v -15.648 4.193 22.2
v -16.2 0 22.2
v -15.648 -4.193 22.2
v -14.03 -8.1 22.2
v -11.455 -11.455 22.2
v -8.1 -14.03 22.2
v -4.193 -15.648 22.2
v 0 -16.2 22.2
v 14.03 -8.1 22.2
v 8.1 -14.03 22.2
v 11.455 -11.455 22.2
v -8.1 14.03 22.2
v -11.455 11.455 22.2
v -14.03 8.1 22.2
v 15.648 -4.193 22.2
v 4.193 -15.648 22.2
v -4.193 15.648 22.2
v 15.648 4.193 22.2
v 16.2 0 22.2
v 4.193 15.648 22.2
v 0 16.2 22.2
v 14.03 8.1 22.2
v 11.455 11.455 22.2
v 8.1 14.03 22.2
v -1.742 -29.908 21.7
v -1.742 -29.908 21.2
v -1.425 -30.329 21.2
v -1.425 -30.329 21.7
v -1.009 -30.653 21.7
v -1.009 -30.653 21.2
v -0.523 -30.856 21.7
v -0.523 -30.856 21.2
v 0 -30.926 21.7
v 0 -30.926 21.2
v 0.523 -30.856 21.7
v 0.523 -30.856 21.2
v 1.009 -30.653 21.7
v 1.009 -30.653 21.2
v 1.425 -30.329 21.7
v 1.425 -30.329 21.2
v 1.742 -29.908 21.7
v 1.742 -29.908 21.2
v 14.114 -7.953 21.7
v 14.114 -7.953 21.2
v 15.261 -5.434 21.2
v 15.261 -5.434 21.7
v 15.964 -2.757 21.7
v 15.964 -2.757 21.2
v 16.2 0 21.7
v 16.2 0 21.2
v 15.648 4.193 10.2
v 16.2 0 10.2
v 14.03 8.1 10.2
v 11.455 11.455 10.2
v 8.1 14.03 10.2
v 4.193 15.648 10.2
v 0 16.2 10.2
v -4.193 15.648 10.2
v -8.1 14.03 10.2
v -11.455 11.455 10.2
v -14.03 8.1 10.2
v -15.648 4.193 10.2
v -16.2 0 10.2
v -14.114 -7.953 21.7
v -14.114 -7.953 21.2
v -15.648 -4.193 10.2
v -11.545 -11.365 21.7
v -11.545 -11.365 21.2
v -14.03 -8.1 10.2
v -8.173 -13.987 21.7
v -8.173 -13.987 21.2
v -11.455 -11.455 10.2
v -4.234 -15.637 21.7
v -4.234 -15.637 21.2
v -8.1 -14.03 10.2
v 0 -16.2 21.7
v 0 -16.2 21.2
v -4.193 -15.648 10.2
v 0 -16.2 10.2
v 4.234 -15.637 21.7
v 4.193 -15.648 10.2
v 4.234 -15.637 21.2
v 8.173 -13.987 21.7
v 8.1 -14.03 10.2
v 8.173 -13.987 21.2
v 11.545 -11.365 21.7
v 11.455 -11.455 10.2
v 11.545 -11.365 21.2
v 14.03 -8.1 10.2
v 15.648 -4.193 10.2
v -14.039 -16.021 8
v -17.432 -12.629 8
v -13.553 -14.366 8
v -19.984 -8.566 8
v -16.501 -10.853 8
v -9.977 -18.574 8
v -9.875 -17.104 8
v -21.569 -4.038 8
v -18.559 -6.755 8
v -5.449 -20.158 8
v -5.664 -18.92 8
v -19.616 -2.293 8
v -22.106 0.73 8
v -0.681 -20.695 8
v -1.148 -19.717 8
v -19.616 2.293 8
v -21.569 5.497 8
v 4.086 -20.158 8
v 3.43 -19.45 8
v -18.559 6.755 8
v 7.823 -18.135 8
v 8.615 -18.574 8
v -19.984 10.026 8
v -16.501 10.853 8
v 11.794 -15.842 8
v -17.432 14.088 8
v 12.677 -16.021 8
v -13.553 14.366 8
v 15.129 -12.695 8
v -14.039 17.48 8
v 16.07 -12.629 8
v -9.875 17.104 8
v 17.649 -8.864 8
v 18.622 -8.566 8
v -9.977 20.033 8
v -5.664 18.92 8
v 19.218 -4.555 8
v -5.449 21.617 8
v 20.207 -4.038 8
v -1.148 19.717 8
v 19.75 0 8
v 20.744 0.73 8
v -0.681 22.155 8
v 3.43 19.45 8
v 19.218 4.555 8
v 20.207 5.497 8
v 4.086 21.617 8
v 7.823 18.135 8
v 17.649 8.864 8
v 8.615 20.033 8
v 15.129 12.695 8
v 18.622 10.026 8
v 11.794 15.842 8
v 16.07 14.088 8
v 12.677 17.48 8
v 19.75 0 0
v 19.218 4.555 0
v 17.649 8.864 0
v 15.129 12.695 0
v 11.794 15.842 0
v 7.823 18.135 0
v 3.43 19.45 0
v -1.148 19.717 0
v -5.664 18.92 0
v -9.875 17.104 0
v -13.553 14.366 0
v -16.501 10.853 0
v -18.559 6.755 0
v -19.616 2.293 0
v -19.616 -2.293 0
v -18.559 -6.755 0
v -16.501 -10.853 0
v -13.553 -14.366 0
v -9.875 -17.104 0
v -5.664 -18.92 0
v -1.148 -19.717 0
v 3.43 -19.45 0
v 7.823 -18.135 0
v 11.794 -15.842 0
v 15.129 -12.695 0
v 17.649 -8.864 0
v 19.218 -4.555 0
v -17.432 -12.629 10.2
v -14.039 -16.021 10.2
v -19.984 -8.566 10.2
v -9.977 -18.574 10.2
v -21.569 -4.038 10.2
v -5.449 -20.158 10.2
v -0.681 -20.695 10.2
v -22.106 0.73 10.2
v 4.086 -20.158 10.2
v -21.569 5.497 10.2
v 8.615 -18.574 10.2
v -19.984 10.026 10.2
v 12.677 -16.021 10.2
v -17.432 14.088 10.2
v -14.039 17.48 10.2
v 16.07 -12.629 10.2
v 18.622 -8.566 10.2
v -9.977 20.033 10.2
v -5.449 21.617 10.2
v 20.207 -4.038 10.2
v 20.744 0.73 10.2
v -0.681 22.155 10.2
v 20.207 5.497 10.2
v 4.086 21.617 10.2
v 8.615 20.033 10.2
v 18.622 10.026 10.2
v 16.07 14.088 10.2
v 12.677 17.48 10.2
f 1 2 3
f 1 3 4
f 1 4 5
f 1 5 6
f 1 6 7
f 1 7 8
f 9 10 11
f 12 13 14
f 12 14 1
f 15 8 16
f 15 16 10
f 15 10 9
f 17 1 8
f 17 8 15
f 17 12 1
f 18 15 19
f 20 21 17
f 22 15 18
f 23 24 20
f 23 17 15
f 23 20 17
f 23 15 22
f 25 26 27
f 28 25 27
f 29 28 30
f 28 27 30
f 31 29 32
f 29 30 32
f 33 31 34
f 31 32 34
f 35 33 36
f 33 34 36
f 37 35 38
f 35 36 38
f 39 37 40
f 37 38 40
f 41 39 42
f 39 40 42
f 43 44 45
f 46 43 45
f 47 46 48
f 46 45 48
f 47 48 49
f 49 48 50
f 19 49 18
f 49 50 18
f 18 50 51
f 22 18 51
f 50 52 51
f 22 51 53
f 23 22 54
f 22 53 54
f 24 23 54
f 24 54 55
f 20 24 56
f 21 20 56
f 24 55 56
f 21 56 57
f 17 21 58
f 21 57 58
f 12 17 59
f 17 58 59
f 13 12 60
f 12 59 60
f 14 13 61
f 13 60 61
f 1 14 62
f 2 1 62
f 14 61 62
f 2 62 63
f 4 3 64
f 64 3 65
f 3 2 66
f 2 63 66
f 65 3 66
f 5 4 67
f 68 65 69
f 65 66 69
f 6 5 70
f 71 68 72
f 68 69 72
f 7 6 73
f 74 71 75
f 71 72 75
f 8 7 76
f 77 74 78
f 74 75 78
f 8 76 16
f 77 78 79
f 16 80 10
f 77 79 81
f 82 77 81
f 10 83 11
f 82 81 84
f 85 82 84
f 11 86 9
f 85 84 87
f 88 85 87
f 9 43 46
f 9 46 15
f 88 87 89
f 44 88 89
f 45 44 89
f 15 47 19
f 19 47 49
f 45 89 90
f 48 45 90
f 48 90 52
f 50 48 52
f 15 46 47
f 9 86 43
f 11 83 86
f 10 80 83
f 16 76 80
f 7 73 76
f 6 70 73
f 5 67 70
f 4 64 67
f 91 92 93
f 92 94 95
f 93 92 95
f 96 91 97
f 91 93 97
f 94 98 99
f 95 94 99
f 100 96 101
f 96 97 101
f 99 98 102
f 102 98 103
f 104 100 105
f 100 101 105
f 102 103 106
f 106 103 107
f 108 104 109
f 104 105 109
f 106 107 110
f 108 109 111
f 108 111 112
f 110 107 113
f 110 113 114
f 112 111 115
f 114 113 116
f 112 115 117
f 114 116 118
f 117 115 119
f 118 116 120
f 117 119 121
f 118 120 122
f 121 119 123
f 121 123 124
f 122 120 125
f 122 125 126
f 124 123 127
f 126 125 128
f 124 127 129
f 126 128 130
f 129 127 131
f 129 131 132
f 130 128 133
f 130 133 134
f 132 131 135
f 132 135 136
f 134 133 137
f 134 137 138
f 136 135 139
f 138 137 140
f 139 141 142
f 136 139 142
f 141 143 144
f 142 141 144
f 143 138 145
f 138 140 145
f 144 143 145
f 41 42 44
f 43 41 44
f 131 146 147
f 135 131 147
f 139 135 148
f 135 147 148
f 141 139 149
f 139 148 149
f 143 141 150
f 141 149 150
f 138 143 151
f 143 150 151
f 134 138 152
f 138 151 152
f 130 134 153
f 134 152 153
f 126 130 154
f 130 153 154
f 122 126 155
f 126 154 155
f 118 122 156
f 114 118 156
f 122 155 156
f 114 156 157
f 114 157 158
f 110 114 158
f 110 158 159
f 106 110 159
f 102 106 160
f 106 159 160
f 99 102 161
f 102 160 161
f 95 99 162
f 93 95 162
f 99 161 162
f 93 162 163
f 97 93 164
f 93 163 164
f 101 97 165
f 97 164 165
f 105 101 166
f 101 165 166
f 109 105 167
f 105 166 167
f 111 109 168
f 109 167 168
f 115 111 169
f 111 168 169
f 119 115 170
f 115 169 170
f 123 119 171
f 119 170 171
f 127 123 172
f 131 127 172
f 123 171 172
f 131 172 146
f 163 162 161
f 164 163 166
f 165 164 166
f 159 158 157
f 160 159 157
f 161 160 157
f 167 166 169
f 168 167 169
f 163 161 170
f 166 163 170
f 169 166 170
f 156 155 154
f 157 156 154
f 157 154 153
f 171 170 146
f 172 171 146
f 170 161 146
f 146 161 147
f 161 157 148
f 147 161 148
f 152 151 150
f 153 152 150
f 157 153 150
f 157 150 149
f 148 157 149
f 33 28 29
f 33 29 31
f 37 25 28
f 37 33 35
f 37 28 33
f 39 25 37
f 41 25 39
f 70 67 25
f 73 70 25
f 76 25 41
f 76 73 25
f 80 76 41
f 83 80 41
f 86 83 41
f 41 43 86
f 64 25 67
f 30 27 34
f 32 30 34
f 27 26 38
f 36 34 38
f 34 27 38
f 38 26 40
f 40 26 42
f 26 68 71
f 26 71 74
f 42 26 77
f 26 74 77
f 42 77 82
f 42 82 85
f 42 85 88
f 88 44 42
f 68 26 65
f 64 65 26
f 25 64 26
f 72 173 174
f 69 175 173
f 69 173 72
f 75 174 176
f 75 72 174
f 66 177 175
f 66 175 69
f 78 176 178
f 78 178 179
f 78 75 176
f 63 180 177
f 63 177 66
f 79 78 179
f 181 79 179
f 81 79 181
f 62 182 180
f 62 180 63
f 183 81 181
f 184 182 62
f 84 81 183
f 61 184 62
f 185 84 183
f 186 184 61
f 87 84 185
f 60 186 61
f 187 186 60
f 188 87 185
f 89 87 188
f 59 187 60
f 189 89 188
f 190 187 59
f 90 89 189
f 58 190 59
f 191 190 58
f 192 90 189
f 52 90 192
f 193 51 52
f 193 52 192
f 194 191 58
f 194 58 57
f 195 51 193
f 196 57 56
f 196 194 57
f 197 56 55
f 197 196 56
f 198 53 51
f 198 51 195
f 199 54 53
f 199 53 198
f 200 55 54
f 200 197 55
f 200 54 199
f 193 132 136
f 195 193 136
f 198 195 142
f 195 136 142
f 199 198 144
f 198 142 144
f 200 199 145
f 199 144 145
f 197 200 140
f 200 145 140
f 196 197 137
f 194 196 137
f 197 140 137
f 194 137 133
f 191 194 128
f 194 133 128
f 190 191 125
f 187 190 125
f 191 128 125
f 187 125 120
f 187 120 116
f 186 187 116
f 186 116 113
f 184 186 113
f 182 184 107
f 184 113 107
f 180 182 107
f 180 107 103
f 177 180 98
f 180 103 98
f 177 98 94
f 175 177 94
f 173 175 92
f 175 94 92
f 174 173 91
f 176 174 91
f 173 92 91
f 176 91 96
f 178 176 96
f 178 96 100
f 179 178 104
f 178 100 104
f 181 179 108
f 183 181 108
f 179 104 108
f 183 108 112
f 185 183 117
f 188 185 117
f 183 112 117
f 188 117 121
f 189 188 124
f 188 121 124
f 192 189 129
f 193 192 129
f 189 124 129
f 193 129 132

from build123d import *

# Parameters (mm, degrees)
F0_R      = 19.75
F1_DEPTH  = 8
F2_R      = 21.425
F3_DEPTH  = 2.2
F4_R      = 16.2
F5_DEPTH  = 12
F10_DEPTH = 0.5


# Not quite as in the source:
# - the program builds the solid bodies; features that only make, move or delete a surface that nothing else refers to are left out


with BuildPart() as f1:
    # F0 (on Top) → F1 (new body)
    with BuildSketch(Plane.XY):
        Circle(F0_R)
    extrude(amount=F1_DEPTH)

    # F2 (on face) → F3 (join)
    with BuildSketch(Plane.XY.offset(8)):
        with Locations((-0.6810527993, 0.7295852411)):
            Circle(F2_R)
    extrude(amount=F3_DEPTH)

    # F4 (on face) → F5 (join)
    with BuildSketch(Plane.XY.offset(10.2)):
        Circle(F4_R)
    extrude(amount=F5_DEPTH)

    # F7 (on offset) → F10 (join)
    with BuildSketch(Plane.XY.offset(21.2)):
        with BuildLine():
            ThreePointArc((14.1136150197, -7.9527272727), (15.6697250027, -4.1109267009), (16.2, 0))
            ThreePointArc((16.2, 0), (-4.1109267009, 15.6697250027), (-14.1136150197, -7.9527272727))
            ThreePointArc((-14.1136150197, -7.9527272727), (0, -16.2), (14.1136150197, -7.9527272727))
        make_face()
        with BuildLine():
            ThreePointArc((14.1136150197, -7.9527272727), (0, -16.2), (-14.1136150197, -7.9527272727))
            Line((-14.1136150197, -7.9527272727), (-1.7424216074, -29.9077441077))
            ThreePointArc((-1.7424216074, -29.9077441077), (0, -30.9259259259), (1.7424216074, -29.9077441077))
            Line((1.7424216074, -29.9077441077), (14.1136150197, -7.9527272727))
        make_face()
    extrude(amount=F10_DEPTH)


solid = f1.part
